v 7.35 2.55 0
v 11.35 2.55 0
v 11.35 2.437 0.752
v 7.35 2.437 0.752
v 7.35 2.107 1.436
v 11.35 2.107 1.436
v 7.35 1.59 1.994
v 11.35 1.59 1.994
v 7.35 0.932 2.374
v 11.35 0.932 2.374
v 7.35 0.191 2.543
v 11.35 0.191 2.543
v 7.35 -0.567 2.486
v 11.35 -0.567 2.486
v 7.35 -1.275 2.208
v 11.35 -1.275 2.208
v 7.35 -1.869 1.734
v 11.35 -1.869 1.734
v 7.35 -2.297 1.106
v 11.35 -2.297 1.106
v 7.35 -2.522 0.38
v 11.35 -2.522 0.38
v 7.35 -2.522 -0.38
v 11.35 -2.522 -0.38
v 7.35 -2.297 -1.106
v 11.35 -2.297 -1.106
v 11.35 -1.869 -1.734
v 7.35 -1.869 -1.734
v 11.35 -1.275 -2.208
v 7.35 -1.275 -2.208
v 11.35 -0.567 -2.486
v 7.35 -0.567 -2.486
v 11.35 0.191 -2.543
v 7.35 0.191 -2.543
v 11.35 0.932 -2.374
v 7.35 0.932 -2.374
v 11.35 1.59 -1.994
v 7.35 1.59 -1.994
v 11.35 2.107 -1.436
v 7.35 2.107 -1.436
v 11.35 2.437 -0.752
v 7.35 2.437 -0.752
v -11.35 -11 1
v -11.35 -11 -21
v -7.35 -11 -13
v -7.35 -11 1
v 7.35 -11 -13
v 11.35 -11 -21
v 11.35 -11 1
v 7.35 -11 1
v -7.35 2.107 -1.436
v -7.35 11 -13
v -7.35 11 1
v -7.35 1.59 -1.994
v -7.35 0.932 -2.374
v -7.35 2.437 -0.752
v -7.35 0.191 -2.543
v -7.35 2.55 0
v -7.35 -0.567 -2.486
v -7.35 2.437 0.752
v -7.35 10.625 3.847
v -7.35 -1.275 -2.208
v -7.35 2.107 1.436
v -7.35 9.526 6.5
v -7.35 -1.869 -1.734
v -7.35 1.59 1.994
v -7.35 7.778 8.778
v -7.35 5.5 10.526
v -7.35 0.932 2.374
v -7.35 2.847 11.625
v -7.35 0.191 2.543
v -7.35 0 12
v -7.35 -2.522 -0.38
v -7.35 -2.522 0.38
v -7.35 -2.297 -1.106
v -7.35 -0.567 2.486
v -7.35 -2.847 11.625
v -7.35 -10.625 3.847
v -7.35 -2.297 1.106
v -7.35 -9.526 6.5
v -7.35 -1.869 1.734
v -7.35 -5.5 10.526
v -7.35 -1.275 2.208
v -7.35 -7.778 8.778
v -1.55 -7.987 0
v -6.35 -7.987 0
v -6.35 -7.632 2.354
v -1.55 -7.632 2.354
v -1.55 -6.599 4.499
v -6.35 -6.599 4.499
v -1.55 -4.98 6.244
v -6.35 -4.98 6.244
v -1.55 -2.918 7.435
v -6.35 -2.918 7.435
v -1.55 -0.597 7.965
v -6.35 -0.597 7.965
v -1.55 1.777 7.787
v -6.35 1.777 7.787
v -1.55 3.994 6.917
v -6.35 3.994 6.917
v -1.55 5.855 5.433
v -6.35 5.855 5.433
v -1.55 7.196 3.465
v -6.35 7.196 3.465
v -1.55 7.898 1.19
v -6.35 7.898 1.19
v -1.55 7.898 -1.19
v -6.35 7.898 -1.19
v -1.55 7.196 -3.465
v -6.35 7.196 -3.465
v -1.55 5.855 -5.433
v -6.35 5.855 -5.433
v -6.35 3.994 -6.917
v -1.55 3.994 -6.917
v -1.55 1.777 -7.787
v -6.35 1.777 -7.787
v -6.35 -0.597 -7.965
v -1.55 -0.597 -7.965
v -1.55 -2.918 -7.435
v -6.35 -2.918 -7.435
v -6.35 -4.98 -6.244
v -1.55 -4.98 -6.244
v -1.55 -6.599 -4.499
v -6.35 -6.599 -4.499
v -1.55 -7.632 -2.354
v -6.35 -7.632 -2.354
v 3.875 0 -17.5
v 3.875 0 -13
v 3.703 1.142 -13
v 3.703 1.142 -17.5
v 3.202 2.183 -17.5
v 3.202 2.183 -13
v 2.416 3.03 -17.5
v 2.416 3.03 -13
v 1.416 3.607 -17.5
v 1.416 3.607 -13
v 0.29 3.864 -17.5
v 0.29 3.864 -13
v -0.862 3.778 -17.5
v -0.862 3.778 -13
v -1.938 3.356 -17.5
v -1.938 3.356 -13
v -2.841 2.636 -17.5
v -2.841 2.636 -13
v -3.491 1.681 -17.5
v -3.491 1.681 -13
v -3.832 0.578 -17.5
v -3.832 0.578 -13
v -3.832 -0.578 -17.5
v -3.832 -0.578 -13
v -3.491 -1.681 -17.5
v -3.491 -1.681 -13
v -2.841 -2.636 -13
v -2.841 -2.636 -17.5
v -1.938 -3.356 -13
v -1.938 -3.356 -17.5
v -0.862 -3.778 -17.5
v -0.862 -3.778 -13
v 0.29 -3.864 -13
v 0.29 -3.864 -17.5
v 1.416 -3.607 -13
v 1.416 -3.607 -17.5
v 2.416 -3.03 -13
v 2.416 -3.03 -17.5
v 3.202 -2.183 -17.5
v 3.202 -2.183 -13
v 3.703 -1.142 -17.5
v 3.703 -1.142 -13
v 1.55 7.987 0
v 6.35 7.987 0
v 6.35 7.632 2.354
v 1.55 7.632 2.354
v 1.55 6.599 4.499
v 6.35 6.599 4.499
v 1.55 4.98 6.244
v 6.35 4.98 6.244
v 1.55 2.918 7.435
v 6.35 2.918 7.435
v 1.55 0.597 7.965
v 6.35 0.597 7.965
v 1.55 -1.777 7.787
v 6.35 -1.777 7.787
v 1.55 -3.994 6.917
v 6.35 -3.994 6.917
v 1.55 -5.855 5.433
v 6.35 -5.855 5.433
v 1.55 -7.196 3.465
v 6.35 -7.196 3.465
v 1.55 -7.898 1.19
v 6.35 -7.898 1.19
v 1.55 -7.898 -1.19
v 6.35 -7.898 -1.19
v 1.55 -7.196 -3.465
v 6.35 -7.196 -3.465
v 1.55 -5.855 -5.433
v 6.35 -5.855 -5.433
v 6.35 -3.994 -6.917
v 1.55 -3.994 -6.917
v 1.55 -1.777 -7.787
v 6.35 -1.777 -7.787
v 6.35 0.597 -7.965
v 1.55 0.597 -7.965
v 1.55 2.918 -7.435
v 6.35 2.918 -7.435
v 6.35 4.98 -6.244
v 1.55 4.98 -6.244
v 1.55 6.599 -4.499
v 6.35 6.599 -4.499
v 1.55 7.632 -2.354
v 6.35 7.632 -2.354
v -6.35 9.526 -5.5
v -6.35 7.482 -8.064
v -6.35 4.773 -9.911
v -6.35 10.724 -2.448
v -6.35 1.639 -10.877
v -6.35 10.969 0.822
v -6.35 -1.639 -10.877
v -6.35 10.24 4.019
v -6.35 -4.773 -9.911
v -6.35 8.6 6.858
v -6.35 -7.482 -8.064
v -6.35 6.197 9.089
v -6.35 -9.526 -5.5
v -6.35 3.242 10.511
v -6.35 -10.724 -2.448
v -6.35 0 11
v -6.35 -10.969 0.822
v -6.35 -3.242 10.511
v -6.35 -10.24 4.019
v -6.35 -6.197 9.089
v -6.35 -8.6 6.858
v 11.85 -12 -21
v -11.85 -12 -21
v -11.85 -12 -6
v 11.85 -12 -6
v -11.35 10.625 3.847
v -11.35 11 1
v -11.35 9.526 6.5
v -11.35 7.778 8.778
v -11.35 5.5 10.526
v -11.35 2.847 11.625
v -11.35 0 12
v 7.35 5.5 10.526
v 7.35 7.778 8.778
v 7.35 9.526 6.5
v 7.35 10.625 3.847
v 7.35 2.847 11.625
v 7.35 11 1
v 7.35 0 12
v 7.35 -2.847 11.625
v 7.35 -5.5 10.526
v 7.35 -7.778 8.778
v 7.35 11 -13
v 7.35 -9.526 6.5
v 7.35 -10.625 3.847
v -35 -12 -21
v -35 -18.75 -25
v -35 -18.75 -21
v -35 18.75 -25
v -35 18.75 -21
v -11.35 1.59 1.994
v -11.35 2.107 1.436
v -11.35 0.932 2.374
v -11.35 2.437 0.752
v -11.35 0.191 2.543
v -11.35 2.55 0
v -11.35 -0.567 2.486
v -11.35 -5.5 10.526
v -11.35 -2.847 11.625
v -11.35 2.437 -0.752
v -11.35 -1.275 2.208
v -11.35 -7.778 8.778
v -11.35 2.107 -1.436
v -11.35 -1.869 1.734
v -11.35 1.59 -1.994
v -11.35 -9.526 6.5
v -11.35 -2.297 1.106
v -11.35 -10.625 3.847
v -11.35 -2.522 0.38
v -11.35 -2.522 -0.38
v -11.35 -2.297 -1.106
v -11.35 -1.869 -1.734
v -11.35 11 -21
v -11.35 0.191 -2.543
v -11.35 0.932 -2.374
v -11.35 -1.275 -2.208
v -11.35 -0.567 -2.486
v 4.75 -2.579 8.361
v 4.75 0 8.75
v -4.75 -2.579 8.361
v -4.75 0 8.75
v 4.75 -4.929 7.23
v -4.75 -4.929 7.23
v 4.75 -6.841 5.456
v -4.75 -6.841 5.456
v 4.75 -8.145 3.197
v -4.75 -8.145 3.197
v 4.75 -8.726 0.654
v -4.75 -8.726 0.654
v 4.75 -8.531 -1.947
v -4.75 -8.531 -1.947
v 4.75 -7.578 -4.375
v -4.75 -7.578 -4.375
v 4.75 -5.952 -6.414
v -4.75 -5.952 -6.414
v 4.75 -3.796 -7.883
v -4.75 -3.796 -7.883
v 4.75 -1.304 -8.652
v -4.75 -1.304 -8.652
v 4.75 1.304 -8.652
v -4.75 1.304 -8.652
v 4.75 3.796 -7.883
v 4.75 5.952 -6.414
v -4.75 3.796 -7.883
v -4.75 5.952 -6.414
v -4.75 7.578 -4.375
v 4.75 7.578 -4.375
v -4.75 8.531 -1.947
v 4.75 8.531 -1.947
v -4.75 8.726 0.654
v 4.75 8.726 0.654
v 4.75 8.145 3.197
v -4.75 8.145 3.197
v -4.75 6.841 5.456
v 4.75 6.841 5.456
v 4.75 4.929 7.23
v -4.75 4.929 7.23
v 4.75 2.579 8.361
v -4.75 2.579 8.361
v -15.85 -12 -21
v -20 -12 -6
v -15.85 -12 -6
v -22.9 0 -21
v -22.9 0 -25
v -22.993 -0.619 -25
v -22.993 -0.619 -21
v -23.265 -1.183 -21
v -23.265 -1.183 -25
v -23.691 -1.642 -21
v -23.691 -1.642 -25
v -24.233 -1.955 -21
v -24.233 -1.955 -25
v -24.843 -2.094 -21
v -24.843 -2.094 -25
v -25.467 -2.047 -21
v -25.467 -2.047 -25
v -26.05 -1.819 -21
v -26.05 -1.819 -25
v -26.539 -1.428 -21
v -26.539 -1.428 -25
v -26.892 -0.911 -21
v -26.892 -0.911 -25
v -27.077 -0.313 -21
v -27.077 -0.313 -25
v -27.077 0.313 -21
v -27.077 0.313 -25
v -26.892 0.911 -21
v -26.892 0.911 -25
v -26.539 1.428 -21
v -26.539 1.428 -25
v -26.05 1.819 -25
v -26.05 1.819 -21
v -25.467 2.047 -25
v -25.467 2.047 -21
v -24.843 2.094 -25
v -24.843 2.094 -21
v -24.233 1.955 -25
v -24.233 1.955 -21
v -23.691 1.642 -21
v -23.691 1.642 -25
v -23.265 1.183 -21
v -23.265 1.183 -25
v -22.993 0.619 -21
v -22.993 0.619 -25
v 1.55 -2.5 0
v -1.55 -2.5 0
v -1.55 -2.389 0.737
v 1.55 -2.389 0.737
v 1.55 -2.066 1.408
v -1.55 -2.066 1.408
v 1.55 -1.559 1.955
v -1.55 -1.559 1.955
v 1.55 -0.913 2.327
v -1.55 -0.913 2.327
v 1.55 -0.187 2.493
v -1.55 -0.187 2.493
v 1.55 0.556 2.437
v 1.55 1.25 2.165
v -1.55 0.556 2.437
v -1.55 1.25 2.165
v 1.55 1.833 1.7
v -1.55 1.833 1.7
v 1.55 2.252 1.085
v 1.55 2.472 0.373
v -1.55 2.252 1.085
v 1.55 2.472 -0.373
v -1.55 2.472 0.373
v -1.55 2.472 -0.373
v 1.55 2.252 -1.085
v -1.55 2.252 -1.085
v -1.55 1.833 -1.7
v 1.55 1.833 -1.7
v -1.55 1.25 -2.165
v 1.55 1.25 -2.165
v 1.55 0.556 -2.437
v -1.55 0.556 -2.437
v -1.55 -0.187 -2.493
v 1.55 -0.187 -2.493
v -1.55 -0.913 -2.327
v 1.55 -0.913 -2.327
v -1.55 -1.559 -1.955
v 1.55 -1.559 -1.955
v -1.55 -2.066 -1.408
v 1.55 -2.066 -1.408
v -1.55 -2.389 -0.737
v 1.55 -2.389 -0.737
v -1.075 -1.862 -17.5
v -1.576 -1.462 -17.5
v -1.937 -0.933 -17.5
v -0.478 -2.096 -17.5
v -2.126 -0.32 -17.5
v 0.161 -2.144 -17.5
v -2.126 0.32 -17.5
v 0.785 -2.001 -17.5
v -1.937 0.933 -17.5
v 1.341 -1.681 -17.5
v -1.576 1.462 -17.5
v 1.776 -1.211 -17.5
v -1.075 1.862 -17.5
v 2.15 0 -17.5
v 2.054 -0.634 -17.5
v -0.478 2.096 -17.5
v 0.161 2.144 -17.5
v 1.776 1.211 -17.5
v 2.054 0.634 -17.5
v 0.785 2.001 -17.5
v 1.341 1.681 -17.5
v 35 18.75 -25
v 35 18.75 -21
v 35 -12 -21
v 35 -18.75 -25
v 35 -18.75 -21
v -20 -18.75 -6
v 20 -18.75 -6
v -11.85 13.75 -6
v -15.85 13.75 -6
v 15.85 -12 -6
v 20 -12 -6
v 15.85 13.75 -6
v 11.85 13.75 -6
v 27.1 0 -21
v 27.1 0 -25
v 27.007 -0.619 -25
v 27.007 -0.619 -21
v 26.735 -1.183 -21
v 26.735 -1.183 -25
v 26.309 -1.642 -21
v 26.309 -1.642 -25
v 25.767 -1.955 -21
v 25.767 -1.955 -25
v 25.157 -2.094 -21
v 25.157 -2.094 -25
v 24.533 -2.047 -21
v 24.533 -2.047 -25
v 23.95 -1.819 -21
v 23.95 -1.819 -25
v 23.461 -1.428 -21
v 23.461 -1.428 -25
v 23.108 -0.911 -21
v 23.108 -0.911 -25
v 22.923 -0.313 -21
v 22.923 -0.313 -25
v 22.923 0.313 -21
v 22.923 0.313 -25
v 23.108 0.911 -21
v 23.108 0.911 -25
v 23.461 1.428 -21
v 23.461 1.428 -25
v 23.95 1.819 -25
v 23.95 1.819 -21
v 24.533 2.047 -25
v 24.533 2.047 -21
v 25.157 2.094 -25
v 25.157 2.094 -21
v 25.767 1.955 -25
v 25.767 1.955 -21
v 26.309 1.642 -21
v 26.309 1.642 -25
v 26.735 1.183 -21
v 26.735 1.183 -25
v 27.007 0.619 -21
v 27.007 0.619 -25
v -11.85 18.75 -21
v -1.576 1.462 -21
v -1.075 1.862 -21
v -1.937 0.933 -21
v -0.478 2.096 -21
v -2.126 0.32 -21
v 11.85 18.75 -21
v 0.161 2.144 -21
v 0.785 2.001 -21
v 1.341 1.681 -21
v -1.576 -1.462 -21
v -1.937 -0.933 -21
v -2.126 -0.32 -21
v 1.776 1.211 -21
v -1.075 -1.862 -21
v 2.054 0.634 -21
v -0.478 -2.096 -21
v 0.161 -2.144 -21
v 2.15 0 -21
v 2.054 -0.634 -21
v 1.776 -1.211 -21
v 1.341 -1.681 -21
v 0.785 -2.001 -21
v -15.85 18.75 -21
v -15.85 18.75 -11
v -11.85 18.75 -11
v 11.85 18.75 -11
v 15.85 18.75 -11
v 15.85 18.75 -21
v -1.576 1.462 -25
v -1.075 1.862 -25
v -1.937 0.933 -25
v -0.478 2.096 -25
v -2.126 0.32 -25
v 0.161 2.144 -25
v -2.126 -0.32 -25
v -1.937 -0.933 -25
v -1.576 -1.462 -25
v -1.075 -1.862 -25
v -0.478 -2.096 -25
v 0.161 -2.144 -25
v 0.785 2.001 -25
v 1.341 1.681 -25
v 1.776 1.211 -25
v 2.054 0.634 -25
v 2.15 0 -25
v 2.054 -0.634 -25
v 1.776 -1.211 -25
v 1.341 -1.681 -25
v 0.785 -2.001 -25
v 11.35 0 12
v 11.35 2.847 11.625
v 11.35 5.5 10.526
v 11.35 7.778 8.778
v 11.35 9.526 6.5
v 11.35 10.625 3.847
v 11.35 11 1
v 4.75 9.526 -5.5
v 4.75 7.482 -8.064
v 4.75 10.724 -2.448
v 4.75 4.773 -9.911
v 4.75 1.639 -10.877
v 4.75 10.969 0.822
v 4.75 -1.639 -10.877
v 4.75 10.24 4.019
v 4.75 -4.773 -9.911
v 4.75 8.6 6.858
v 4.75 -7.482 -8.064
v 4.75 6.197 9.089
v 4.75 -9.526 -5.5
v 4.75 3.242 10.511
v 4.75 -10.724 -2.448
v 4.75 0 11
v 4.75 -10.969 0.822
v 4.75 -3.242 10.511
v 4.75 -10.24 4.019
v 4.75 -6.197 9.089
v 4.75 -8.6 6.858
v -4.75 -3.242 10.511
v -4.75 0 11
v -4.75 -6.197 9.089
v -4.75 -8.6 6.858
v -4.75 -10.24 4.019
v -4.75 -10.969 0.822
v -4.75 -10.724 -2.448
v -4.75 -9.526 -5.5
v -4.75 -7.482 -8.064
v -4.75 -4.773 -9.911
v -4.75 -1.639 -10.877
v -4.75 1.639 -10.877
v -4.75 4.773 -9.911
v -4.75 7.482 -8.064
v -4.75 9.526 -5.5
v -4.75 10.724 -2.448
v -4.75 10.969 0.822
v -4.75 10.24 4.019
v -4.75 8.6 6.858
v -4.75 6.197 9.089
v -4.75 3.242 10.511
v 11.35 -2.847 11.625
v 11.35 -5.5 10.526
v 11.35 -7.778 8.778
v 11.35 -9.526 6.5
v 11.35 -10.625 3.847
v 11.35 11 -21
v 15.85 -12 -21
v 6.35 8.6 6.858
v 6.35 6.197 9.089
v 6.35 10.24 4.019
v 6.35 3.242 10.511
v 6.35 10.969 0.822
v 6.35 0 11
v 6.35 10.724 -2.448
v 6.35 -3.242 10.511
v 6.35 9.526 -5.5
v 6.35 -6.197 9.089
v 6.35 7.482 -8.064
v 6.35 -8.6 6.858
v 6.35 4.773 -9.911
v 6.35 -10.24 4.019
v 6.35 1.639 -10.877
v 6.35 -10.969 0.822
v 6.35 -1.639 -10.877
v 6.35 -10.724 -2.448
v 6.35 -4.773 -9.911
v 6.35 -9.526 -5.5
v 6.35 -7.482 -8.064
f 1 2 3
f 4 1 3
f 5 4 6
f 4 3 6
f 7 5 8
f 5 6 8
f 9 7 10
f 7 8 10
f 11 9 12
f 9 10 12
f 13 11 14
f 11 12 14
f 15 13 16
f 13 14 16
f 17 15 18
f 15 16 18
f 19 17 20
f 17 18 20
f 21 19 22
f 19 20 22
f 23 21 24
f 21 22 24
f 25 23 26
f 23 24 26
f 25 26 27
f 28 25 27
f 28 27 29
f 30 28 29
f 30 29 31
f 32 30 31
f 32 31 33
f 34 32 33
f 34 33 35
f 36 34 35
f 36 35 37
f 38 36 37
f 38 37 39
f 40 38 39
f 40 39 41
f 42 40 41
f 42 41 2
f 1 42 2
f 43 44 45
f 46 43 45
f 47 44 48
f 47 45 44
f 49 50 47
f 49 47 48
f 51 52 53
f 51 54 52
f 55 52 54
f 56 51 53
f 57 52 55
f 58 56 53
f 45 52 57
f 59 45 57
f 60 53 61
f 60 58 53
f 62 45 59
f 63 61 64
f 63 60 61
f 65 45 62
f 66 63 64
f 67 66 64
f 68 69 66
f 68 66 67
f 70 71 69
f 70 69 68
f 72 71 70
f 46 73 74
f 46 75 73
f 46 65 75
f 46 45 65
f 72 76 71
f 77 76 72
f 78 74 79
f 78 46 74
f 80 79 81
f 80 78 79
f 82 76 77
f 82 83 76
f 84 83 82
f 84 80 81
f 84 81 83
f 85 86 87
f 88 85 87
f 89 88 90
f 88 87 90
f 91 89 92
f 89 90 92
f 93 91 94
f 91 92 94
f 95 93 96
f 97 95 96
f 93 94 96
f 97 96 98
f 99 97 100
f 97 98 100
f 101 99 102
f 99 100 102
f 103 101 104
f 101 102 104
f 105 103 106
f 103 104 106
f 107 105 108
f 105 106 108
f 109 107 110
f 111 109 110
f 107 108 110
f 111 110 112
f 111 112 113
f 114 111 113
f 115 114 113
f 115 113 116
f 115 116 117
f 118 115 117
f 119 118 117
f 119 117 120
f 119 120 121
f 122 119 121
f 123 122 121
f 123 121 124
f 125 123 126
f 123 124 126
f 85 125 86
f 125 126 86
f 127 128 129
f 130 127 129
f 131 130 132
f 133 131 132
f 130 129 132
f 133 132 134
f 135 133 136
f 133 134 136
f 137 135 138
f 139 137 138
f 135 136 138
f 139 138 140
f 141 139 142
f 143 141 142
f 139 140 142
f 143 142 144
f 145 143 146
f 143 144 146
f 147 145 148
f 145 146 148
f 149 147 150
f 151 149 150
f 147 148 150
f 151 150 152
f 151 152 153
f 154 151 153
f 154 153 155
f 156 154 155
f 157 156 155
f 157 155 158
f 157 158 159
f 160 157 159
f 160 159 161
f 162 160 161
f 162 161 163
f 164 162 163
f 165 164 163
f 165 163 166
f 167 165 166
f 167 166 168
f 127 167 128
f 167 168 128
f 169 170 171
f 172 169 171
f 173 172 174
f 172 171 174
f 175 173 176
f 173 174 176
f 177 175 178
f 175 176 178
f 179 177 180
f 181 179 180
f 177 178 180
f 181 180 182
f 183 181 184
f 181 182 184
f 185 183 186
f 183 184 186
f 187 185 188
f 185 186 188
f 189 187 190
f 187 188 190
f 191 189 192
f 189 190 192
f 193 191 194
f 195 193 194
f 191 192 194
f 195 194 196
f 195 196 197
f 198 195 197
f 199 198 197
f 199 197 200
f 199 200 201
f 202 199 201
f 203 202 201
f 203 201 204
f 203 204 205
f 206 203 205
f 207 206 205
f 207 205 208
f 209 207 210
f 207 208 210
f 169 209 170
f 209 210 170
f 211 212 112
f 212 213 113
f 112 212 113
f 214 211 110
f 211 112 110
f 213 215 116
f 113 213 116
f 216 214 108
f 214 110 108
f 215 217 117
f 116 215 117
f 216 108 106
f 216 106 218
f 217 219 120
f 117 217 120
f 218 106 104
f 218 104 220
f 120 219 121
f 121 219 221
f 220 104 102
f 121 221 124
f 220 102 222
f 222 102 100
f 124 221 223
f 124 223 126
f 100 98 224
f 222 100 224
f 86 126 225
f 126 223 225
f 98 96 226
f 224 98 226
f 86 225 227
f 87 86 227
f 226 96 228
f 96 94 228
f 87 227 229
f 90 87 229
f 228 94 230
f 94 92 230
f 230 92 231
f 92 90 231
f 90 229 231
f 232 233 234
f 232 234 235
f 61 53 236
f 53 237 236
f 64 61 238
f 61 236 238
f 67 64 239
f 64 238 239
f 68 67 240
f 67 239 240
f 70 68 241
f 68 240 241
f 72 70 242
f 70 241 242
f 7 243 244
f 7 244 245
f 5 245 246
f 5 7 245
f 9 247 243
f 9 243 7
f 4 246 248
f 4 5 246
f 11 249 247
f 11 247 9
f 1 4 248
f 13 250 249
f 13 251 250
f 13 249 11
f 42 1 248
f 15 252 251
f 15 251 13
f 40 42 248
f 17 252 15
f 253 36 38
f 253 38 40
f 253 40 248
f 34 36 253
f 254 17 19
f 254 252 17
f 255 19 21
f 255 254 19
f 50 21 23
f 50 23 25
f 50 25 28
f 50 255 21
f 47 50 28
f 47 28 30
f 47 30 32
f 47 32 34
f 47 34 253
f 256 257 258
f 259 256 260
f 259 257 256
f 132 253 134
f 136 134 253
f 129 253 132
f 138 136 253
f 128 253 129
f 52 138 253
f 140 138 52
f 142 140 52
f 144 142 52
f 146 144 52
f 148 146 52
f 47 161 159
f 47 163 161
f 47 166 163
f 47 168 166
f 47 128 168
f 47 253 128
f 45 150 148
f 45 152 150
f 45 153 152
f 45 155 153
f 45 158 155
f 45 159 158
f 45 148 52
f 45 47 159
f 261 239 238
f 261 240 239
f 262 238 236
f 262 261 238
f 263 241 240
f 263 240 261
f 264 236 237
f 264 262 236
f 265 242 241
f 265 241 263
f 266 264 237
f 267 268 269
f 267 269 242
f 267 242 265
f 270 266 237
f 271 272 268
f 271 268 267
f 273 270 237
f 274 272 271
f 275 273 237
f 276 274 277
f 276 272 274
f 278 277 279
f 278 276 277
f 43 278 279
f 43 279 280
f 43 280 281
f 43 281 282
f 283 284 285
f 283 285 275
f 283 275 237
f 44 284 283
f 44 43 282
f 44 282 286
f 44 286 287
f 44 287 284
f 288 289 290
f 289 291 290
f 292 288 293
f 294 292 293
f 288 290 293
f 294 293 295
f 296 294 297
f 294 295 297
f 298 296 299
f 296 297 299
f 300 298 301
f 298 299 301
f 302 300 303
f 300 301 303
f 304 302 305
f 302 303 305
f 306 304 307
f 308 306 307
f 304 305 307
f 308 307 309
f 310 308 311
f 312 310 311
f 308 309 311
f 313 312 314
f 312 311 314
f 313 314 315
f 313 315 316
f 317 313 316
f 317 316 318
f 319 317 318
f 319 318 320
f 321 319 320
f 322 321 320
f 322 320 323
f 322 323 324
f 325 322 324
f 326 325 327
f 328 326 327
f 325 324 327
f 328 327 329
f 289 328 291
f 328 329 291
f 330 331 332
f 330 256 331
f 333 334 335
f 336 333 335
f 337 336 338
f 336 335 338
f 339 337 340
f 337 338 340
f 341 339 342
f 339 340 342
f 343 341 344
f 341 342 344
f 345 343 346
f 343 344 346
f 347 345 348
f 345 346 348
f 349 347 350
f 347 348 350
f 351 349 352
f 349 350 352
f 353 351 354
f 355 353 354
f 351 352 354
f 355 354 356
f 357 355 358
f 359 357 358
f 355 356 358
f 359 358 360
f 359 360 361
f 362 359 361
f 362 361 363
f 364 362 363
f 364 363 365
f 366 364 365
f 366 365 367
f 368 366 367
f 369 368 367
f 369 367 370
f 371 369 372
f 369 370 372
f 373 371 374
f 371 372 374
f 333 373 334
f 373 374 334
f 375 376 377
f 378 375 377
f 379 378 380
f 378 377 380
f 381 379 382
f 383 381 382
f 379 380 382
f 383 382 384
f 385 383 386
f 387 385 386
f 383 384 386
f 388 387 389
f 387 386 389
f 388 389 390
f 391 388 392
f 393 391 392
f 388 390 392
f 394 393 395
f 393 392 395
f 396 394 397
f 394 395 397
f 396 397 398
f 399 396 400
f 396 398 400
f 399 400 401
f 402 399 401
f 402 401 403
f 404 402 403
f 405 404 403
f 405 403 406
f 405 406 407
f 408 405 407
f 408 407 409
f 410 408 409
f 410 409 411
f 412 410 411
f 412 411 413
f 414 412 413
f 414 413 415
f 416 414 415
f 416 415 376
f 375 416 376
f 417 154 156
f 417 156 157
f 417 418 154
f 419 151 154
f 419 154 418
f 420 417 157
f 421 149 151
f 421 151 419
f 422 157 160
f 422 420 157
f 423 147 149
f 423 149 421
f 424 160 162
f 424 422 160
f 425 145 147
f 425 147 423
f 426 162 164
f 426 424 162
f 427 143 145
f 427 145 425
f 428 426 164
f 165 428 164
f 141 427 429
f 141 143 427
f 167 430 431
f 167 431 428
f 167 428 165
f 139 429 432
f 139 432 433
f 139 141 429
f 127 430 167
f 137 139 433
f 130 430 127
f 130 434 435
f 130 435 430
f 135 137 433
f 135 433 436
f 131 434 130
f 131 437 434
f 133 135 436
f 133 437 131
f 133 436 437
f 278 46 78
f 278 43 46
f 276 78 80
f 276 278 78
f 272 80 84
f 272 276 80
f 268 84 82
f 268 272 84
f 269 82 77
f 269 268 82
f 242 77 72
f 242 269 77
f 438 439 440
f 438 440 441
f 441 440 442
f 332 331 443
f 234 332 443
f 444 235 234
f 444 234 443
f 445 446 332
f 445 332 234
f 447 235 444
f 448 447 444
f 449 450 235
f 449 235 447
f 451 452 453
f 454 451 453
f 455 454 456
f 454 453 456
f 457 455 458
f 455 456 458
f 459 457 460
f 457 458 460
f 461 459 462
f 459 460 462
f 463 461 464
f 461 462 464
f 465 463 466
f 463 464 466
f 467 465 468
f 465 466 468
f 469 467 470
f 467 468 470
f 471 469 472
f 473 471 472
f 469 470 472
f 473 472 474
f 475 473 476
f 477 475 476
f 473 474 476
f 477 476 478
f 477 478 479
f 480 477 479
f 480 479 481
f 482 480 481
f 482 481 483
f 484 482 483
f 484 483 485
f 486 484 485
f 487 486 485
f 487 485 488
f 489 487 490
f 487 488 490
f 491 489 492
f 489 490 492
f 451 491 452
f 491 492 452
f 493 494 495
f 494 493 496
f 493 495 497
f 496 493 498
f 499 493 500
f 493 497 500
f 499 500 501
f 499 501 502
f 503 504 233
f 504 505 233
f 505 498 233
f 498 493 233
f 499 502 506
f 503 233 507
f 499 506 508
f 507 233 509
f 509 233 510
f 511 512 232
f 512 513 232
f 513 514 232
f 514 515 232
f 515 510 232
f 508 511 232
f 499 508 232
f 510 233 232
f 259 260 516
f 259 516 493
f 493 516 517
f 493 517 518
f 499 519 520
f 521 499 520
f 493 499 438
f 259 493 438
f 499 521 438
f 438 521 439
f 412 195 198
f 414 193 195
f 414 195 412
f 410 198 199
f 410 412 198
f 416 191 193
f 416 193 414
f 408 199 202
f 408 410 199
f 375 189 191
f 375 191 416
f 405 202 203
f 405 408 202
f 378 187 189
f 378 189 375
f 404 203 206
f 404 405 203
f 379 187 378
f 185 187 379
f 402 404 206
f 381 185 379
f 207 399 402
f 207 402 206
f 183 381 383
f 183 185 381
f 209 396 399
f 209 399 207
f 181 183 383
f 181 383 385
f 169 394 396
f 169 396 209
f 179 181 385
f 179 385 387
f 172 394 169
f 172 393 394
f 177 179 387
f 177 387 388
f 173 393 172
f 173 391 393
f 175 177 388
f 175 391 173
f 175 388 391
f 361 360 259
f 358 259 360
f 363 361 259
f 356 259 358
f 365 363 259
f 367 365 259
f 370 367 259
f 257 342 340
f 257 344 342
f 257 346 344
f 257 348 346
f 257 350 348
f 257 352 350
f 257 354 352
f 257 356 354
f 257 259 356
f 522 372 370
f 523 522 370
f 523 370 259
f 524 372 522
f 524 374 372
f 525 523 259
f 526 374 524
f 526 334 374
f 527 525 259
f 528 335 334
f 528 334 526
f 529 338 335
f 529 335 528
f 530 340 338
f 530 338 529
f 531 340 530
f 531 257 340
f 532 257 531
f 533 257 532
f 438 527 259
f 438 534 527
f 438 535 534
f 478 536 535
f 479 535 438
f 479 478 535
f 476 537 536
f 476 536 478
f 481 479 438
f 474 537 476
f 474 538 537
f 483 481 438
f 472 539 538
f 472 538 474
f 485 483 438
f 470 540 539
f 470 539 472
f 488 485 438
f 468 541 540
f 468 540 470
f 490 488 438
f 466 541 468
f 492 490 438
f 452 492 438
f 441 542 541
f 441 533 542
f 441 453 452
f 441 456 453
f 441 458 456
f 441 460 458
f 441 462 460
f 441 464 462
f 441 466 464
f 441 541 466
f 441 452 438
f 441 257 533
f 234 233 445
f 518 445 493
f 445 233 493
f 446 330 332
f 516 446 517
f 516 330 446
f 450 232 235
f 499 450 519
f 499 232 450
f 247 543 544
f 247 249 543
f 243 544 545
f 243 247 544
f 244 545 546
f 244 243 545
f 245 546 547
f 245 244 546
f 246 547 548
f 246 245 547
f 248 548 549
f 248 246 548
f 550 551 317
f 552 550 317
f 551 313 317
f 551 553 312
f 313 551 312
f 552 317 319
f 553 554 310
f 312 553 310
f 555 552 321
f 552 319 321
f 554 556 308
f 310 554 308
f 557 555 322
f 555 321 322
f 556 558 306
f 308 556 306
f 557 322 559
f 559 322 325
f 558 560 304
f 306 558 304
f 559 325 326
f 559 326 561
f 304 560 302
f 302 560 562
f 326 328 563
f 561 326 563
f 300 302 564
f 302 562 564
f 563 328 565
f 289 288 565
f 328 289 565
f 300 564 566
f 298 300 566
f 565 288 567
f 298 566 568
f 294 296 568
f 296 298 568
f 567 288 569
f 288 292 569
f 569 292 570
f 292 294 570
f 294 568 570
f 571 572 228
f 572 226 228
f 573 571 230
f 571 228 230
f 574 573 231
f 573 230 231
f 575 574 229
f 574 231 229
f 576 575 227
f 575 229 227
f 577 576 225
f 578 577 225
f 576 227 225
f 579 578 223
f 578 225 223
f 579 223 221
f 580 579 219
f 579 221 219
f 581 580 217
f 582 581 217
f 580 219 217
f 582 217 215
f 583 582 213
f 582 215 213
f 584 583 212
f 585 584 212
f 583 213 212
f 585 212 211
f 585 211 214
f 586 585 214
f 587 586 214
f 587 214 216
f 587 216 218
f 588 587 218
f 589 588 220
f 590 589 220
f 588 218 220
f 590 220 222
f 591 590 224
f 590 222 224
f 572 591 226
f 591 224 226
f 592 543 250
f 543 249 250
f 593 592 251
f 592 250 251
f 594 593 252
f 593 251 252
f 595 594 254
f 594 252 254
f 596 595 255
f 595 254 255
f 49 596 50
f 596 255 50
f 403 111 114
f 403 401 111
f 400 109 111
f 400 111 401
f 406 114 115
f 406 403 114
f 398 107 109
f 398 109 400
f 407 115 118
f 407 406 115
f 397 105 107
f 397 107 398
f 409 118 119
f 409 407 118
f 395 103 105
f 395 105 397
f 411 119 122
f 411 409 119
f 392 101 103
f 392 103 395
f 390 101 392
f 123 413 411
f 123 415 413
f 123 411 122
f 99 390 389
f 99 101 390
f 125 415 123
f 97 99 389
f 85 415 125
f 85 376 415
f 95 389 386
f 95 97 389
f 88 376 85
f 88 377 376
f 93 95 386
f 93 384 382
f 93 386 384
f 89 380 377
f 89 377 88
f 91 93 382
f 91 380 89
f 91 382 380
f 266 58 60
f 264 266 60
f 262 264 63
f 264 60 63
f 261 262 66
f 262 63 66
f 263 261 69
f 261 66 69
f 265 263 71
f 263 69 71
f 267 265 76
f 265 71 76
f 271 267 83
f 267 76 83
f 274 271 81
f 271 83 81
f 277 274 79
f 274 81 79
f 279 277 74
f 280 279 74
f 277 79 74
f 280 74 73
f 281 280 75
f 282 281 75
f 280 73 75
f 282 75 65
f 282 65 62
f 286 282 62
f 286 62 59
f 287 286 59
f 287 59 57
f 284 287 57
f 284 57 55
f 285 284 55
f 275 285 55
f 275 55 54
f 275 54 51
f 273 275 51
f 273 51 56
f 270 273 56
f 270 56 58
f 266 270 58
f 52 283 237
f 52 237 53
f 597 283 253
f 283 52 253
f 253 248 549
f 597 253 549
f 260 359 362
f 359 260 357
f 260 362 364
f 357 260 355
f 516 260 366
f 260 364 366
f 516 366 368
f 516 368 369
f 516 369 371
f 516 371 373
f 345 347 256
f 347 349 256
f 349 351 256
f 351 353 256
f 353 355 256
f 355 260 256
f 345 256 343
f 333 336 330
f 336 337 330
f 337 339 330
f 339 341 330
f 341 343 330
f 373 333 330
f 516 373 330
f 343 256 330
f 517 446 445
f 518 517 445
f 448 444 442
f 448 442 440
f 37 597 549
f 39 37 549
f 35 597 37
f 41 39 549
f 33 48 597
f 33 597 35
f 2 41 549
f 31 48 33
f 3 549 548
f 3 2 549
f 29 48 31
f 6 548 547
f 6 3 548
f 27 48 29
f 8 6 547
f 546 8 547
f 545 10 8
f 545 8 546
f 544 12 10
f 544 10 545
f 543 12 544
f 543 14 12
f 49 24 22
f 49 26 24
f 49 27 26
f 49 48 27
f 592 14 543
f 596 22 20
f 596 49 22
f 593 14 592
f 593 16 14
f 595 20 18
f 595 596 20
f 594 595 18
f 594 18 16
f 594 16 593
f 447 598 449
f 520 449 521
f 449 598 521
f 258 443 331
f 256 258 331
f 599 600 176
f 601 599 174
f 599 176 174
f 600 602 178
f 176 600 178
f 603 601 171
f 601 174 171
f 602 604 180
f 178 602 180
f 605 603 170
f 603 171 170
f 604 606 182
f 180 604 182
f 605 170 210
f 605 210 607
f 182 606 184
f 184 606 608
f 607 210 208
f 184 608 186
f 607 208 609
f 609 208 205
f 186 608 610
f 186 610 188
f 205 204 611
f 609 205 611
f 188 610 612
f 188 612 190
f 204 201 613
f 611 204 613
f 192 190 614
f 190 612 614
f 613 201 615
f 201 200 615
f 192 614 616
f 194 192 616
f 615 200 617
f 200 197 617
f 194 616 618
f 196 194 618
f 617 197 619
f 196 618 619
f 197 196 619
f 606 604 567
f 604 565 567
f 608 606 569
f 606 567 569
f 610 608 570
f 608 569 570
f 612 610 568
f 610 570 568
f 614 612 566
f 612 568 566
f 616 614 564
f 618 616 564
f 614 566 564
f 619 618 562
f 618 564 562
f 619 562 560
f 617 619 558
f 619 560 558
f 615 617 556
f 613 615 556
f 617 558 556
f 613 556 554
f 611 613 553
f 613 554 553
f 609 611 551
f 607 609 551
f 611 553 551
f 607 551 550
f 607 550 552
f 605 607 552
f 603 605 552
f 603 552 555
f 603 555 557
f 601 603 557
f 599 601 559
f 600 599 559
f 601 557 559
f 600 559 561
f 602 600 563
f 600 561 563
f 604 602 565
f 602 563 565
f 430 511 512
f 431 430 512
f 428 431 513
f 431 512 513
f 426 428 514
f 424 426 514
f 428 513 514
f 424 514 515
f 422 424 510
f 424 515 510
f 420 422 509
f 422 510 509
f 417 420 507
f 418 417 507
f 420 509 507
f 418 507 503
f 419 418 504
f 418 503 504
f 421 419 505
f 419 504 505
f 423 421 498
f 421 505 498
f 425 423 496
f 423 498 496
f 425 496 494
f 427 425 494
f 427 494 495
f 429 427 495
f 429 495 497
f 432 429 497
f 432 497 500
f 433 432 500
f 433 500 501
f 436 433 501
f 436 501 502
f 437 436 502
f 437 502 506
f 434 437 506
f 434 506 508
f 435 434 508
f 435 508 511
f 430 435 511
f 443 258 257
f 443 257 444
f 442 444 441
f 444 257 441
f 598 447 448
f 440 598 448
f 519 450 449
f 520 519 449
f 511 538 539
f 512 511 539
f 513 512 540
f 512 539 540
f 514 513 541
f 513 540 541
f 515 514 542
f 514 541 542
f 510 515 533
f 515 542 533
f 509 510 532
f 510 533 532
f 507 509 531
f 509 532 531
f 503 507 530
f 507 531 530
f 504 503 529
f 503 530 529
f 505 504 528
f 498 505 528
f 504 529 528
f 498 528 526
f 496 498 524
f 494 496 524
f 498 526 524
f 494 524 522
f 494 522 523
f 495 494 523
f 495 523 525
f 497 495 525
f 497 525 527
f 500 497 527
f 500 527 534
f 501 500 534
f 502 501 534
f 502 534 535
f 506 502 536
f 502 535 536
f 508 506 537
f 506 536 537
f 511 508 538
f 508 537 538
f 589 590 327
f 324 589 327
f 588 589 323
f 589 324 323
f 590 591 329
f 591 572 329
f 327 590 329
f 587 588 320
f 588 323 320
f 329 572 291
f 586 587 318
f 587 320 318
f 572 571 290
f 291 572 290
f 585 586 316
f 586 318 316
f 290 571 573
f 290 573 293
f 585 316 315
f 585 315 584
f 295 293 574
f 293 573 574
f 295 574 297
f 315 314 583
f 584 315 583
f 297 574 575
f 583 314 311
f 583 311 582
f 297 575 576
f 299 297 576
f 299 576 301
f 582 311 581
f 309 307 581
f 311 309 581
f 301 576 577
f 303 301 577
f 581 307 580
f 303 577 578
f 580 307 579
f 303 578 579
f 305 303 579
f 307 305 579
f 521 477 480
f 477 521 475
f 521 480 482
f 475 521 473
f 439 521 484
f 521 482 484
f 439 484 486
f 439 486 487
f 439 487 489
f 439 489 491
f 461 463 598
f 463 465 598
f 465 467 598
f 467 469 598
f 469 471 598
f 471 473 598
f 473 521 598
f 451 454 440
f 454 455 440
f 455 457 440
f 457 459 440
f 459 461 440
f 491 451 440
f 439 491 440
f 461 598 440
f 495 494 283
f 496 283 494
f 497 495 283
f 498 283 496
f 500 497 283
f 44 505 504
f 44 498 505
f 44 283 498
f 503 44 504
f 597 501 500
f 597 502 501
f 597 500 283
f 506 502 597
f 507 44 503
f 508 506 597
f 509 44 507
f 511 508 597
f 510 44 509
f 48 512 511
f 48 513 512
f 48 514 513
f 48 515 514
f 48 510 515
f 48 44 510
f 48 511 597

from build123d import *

# Parameters (mm, degrees)
F3_R      = 7.987
F4_DEPTH  = 4.8
F5_R      = 7.987
F6_DEPTH  = 4.8
F2_R      = 2.5
F7_DEPTH  = 12.701
F10_DEPTH = 22
F11_R     = 2.55
F12_DEPTH = 22.701
F13_R     = 10.99999
F14_R     = 2.15
F15_DEPTH = 8
F16_R     = 3.875
F17_DEPTH = 4.5
F18_W     = 70
F18_H     = 37.5
F19_DEPTH = 4
F20_W     = 4
F20_H     = 37.5
F21_DEPTH = 15
F22_W     = 70
F22_H     = 6.75
F23_DEPTH = 15
F24_SIZE  = 15
F25_SIZE  = 5
F26_R     = 2.15
F27_DEPTH = 4
F28_R     = 2.1
F29_DEPTH = 4


# Not quite as in the source:
# - a fillet or chamfer is up to 0.001 mm smaller than in the source, because OpenCascade refuses the exact size


with BuildPart() as f1:
    # F0 (on Front) → F1 (revolve)
    with BuildSketch(Plane.XZ):
        Polygon((-6.35, 11), (-6.35, 0), (6.35, 0), (6.35, 11), (4.75, 11), (4.75, 8.75), (0, 8.75), (-4.75, 8.75), (-4.75, 11), align=None)
    revolve(axis=Axis((1.279097545, 0, 0), (1, 0, 0)))

    # F3 (on face) → F4 (cut)
    with BuildSketch(Plane(origin=(-6.35, 0, 0), x_dir=(0, -1, 0), z_dir=(-1, 0, 0))):
        Circle(F3_R)
    extrude(amount=-F4_DEPTH, mode=Mode.SUBTRACT)

    # F5 (on face) → F6 (cut)
    with BuildSketch(Plane.YZ.offset(6.35)):
        Circle(F5_R)
    extrude(amount=-F6_DEPTH, mode=Mode.SUBTRACT)

    # F2 (on face) → F7 (cut, through all)
    with BuildSketch(Plane(origin=(-6.35, 0, 0), x_dir=(0, -1, 0), z_dir=(-1, 0, 0))):
        Circle(F2_R)
    extrude(amount=-F7_DEPTH, mode=Mode.SUBTRACT)


with BuildPart() as f10:
    # F9 (on offset) → F10 (new body)
    with BuildSketch(Plane.XZ.offset(11)):
        Polygon((7.35, 12), (7.35, 0), (7.35, -13), (0, -13), (-7.35, -13), (-7.35, 0), (-7.35, 12), (-11.35, 12), (-11.35, -21), (0, -21), (11.35, -21), (11.35, 12), align=None)
    extrude(amount=-F10_DEPTH)

    # F11 (on face) → F12 (cut, through all)
    with BuildSketch(Plane.YZ.offset(11.35)):
        Circle(F11_R)
    extrude(amount=-F12_DEPTH, mode=Mode.SUBTRACT)

    # F13 (radius 11 in the source; OpenCascade refuses exactly that, so slightly less here)
    f13_edges = [f10.edges().sort_by_distance(p)[0] for p in [
        (-9.35, 11, 12),
        (9.35, 11, 12),
        (-9.35, -11, 12),
        (9.35, -11, 12),
    ]]
    fillet(f13_edges, radius=F13_R)

    # F14 (on face) → F15 (cut, through all)
    with BuildSketch(Plane(origin=(0, 0, -21), x_dir=(1, 0, 0), z_dir=(0, 0, -1))):
        Circle(F14_R)
    extrude(amount=-F15_DEPTH, mode=Mode.SUBTRACT)

    # F16 (on face) → F17 (cut)
    with BuildSketch(Plane.XY.offset(-13)):
        Circle(F16_R)
    extrude(amount=-F17_DEPTH, mode=Mode.SUBTRACT)


with BuildPart() as f19:
    # F18 (on face) → F19 (new body)
    with BuildSketch(Plane(origin=(0, 0, -21), x_dir=(1, 0, 0), z_dir=(0, 0, -1))):
        Rectangle(F18_W, F18_H)
    extrude(amount=F19_DEPTH)

    # F20 (on face) → F21 (join)
    with BuildSketch(Plane.XY.offset(-21)):
        with Locations((-13.85, 0)):
            Rectangle(F20_W, F20_H)
        with Locations((13.85, 0)):
            Rectangle(F20_W, F20_H)
    extrude(amount=F21_DEPTH)

    # F22 (on face) → F23 (join, through all)
    with BuildSketch(Plane.XY.offset(-21)):
        with Locations((0, -15.375)):
            Rectangle(F22_W, F22_H)
    extrude(amount=F23_DEPTH)

    # F24
    f24_edges = [f19.edges().sort_by_distance(p)[0] for p in [
        (35, -15.375, -6),
        (-35, -15.375, -6),
    ]]
    chamfer(f24_edges, length=F24_SIZE)

    # F25
    f25_edges = [f19.edges().sort_by_distance(p)[0] for p in [
        (-13.85, 18.75, -6),
        (13.85, 18.75, -6),
    ]]
    chamfer(f25_edges, length=F25_SIZE)

    # F26 (on face) → F27 (cut, through all)
    with BuildSketch(Plane(origin=(0, 0, -25), x_dir=(1, 0, 0), z_dir=(0, 0, -1))):
        Circle(F26_R)
    extrude(amount=-F27_DEPTH, mode=Mode.SUBTRACT)

    # F28 (on face) → F29 (cut, through all)
    with BuildSketch(Plane(origin=(0, 0, -25), x_dir=(1, 0, 0), z_dir=(0, 0, -1))):
        with Locations((-25, 0)):
            Circle(F28_R)
        with Locations((25, 0)):
            Circle(F28_R)
    extrude(amount=-F29_DEPTH, mode=Mode.SUBTRACT)


solid = Compound([f1.part, f10.part, f19.part])
